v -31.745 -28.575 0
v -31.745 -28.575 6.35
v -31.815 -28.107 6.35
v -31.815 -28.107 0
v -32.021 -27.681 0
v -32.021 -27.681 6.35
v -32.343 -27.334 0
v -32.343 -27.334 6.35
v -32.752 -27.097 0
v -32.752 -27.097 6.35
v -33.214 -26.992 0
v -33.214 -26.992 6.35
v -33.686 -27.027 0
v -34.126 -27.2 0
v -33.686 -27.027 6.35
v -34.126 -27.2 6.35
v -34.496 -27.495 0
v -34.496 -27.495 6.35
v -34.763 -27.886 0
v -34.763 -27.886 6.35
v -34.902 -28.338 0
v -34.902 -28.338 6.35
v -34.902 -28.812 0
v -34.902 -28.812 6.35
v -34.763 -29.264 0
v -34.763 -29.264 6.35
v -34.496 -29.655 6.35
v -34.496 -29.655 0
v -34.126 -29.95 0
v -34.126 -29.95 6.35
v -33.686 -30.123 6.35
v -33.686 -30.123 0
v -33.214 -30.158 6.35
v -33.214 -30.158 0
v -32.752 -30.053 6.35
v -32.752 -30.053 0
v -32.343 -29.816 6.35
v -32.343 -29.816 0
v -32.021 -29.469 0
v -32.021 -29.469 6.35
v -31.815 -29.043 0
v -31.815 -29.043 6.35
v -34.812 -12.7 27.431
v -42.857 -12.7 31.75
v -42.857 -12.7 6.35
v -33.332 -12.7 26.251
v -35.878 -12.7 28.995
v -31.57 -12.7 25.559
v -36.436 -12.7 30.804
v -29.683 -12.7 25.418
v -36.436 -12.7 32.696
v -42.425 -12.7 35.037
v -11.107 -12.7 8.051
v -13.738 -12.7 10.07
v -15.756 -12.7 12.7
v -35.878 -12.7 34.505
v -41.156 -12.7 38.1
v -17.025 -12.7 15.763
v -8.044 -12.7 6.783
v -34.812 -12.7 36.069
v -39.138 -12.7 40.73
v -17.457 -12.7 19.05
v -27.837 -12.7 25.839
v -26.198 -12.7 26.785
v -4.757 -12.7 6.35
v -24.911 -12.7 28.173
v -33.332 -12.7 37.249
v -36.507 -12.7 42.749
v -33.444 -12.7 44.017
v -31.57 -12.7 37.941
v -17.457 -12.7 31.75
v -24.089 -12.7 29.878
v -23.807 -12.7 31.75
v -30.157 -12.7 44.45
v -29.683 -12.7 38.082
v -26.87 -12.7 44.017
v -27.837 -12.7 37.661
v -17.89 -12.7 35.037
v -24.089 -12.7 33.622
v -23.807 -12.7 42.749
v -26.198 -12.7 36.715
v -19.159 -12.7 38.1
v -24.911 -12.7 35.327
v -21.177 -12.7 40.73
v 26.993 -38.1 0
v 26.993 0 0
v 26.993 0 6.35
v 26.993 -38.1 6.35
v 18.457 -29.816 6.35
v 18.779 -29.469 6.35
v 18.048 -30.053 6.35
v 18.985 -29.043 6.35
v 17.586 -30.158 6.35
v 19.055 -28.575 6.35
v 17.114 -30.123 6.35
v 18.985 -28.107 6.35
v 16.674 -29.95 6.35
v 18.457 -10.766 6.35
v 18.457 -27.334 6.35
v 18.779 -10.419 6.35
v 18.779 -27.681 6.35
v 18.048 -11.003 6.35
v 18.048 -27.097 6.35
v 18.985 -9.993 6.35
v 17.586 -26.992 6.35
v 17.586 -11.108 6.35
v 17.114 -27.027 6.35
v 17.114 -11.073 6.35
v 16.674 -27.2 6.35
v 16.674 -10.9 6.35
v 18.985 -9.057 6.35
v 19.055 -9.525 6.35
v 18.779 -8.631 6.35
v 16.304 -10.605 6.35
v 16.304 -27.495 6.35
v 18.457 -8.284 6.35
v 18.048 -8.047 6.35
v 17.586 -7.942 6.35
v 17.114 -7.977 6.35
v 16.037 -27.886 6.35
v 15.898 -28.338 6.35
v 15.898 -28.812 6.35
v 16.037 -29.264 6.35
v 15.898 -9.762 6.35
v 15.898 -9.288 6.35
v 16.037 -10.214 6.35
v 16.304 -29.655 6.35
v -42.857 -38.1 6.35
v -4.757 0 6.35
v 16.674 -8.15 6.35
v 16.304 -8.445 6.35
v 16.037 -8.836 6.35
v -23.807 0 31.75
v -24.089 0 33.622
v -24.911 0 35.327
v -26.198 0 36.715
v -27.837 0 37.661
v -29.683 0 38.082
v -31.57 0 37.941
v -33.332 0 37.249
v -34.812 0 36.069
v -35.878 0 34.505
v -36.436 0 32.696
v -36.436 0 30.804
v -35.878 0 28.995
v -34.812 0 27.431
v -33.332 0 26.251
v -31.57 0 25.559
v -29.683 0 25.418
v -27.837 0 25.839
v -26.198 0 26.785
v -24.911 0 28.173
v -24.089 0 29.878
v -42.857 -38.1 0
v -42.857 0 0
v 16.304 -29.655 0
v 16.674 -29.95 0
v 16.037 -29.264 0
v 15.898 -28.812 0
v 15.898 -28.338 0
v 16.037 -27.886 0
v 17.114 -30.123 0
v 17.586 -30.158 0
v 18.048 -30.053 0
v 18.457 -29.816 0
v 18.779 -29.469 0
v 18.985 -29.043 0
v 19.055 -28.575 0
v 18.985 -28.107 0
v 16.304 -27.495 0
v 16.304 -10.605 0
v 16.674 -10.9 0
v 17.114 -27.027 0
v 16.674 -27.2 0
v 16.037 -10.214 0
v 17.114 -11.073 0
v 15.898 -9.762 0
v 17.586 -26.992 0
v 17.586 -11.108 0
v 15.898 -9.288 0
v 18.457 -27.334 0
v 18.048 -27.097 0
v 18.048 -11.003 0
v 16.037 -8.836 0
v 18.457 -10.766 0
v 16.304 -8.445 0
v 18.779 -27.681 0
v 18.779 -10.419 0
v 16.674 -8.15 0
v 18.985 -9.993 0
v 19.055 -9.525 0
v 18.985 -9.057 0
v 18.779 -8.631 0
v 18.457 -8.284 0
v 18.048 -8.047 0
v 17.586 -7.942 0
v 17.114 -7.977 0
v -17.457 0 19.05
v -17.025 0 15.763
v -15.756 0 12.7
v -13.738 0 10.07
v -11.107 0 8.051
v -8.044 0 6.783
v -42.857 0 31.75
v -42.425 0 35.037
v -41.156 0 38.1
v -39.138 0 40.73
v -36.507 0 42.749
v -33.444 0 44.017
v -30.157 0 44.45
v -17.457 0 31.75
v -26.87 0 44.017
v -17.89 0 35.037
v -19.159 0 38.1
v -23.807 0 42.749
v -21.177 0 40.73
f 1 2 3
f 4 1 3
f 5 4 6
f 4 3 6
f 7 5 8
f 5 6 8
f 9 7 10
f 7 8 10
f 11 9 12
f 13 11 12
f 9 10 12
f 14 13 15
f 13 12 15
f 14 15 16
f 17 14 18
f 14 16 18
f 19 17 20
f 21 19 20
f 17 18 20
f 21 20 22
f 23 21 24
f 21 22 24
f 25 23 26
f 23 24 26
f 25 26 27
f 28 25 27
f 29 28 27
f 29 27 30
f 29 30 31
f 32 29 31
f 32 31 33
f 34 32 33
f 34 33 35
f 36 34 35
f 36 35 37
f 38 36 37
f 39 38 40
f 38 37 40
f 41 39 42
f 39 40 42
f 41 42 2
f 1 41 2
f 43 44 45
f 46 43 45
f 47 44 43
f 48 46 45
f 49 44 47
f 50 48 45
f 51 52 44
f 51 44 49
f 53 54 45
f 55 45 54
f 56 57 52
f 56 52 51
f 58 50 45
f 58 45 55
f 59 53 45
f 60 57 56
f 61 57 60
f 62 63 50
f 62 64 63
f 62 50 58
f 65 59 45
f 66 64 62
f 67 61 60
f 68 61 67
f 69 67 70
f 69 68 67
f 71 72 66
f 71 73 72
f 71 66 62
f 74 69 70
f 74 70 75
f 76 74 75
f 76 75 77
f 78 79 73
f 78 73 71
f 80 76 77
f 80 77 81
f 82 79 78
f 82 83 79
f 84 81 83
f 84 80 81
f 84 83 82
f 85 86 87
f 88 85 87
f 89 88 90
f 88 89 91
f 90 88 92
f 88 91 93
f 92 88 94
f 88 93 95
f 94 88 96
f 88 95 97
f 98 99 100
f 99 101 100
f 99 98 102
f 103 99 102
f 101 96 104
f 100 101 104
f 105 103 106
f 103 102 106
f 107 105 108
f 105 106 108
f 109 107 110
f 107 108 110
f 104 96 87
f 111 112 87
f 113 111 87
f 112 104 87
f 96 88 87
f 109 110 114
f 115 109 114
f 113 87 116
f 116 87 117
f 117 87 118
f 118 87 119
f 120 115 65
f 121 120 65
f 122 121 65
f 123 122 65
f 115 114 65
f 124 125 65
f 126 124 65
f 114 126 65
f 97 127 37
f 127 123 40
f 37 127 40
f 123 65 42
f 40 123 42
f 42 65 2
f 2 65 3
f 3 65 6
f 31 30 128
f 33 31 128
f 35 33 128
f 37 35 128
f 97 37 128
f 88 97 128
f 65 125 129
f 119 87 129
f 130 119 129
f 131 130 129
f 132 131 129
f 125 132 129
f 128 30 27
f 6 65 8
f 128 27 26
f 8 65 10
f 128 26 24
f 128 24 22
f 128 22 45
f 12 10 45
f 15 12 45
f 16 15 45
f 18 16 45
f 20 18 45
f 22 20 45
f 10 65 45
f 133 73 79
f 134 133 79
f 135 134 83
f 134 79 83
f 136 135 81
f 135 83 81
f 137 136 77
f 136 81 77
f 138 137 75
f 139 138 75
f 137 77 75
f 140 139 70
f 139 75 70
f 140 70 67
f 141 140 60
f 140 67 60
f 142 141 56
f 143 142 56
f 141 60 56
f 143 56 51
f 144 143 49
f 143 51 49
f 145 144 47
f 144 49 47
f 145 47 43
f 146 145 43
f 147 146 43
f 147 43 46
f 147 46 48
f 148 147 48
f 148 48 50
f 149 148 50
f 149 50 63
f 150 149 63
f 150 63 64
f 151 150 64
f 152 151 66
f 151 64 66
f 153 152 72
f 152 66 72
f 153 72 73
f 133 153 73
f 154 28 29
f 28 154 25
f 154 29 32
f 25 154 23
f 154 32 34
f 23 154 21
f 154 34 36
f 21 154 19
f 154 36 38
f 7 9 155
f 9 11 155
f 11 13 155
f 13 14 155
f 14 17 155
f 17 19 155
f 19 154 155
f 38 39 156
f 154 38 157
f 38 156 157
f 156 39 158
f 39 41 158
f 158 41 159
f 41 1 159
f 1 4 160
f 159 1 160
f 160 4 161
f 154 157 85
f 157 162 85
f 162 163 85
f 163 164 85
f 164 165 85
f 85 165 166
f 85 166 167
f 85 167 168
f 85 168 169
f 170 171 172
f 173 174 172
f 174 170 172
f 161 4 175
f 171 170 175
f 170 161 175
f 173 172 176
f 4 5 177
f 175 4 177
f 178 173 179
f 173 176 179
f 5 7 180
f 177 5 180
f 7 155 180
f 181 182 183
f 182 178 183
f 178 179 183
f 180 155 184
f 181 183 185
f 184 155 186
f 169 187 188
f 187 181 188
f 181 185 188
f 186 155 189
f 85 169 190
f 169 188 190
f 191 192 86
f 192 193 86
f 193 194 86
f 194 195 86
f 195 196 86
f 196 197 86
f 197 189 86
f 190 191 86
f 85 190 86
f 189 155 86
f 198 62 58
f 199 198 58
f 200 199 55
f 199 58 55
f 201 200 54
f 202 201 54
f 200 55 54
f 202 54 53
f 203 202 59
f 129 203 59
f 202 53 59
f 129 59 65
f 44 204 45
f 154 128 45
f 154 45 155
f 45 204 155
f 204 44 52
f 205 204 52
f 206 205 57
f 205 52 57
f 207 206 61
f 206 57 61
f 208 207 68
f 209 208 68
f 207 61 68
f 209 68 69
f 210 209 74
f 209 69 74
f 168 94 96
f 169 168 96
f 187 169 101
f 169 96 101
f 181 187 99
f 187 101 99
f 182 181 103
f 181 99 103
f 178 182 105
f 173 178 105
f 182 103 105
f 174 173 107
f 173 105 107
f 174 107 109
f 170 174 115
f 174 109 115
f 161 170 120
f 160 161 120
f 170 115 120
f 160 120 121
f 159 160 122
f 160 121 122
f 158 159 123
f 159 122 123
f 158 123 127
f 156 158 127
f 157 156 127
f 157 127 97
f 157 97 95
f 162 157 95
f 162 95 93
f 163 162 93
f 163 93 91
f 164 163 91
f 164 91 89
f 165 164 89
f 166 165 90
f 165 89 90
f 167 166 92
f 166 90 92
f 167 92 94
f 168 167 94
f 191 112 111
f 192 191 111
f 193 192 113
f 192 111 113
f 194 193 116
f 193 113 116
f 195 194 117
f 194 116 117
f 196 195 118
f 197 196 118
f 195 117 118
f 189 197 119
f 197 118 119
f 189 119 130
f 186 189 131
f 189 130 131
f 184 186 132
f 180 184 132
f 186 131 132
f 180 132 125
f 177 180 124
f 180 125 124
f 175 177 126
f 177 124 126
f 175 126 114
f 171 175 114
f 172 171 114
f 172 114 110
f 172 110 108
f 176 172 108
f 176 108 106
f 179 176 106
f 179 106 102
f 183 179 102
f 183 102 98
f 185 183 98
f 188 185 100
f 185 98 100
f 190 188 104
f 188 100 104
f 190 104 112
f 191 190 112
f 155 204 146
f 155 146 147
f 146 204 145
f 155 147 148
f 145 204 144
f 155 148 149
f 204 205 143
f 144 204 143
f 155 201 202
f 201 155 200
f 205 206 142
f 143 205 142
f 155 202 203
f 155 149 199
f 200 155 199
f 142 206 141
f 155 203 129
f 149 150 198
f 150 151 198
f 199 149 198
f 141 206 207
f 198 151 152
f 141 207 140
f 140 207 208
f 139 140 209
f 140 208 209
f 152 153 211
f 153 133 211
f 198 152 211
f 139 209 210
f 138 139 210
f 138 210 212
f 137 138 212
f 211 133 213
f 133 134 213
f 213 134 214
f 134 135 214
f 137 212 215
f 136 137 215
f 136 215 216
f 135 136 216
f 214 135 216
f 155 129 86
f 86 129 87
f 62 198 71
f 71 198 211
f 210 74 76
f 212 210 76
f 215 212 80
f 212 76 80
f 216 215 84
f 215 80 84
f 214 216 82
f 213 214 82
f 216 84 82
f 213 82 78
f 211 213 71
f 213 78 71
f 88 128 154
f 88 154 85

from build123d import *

# Parameters (mm, degrees)
F1_DEPTH  = 38.1
F2_W      = 25.4
F2_H      = 38.1
F3_DEPTH  = 25.4
F4_R      = 6.35
F5_DEPTH  = 12.7
F7_DEPTH  = 12.7
F8_W      = 12.7
F8_H      = 12.7
F9_DEPTH  = 12.7
F11_DEPTH = 12.7
F12_R     = 1.5875
F13_DEPTH = 6.35


with BuildPart() as f1:
    # F0 (on Front) → F1 (new body)
    with BuildSketch(Plane.XZ):
        Polygon((-17.457331, 44.45), (-42.857331, 44.45), (-42.857331, 0), (26.992669, 0), (26.992669, 6.35), (-17.457331, 6.35), align=None)
    extrude(amount=F1_DEPTH)

    # F2 (on face) → F3 (cut)
    with BuildSketch(Plane.XZ.offset(38.1)):
        with Locations((-30.157331, 25.4)):
            Rectangle(F2_W, F2_H)
    extrude(amount=-F3_DEPTH, mode=Mode.SUBTRACT)

    # F4 (on face) → F5 (cut)
    with BuildSketch(Plane.XZ.offset(12.7)):
        with Locations((-30.157331, 31.75)):
            Circle(F4_R)
    extrude(amount=-F5_DEPTH, mode=Mode.SUBTRACT)

    # F6 (on face) → F7 (cut)
    with BuildSketch(Plane.XZ.offset(12.7)):
        with BuildLine():
            ThreePointArc((-42.857331, 31.75), (-39.137587, 40.730256), (-30.157331, 44.45))
            Line((-30.157331, 44.45), (-42.857331, 44.45))
            Line((-42.857331, 44.45), (-42.857331, 31.75))
        make_face()
        with BuildLine():
            Line((-17.457331, 44.45), (-30.157331, 44.45))
            ThreePointArc((-30.157331, 44.45), (-21.177075, 40.730256), (-17.457331, 31.75))
            Line((-17.457331, 31.75), (-17.457331, 44.45))
        make_face()
    extrude(amount=-F7_DEPTH, mode=Mode.SUBTRACT)

    # F8 (on face) → F9 (join)
    with BuildSketch(Plane.XZ.offset(12.7)):
        with Locations((-11.107331, 12.7)):
            Rectangle(F8_W, F8_H)
    extrude(amount=-F9_DEPTH)

    # F10 (on face) → F11 (cut)
    with BuildSketch(Plane.XZ.offset(12.7)):
        with BuildLine():
            Line((-4.757331, 19.05), (-17.457331, 19.05))
            ThreePointArc((-17.457331, 19.05), (-13.737587, 10.069744), (-4.757331, 6.35))
            Line((-4.757331, 6.35), (-4.757331, 19.05))
        make_face()
    extrude(amount=-F11_DEPTH, mode=Mode.SUBTRACT)

    # F12 (on face) → F13 (cut)
    with BuildSketch(Plane.XY.offset(6.35)):
        with Locations((-33.332331, -28.575)):
            Circle(F12_R)
        with Locations((17.467669, -28.575)):
            Circle(F12_R)
        with Locations((17.467669, -9.525)):
            Circle(F12_R)
    extrude(amount=-F13_DEPTH, mode=Mode.SUBTRACT)


solid = f1.part
